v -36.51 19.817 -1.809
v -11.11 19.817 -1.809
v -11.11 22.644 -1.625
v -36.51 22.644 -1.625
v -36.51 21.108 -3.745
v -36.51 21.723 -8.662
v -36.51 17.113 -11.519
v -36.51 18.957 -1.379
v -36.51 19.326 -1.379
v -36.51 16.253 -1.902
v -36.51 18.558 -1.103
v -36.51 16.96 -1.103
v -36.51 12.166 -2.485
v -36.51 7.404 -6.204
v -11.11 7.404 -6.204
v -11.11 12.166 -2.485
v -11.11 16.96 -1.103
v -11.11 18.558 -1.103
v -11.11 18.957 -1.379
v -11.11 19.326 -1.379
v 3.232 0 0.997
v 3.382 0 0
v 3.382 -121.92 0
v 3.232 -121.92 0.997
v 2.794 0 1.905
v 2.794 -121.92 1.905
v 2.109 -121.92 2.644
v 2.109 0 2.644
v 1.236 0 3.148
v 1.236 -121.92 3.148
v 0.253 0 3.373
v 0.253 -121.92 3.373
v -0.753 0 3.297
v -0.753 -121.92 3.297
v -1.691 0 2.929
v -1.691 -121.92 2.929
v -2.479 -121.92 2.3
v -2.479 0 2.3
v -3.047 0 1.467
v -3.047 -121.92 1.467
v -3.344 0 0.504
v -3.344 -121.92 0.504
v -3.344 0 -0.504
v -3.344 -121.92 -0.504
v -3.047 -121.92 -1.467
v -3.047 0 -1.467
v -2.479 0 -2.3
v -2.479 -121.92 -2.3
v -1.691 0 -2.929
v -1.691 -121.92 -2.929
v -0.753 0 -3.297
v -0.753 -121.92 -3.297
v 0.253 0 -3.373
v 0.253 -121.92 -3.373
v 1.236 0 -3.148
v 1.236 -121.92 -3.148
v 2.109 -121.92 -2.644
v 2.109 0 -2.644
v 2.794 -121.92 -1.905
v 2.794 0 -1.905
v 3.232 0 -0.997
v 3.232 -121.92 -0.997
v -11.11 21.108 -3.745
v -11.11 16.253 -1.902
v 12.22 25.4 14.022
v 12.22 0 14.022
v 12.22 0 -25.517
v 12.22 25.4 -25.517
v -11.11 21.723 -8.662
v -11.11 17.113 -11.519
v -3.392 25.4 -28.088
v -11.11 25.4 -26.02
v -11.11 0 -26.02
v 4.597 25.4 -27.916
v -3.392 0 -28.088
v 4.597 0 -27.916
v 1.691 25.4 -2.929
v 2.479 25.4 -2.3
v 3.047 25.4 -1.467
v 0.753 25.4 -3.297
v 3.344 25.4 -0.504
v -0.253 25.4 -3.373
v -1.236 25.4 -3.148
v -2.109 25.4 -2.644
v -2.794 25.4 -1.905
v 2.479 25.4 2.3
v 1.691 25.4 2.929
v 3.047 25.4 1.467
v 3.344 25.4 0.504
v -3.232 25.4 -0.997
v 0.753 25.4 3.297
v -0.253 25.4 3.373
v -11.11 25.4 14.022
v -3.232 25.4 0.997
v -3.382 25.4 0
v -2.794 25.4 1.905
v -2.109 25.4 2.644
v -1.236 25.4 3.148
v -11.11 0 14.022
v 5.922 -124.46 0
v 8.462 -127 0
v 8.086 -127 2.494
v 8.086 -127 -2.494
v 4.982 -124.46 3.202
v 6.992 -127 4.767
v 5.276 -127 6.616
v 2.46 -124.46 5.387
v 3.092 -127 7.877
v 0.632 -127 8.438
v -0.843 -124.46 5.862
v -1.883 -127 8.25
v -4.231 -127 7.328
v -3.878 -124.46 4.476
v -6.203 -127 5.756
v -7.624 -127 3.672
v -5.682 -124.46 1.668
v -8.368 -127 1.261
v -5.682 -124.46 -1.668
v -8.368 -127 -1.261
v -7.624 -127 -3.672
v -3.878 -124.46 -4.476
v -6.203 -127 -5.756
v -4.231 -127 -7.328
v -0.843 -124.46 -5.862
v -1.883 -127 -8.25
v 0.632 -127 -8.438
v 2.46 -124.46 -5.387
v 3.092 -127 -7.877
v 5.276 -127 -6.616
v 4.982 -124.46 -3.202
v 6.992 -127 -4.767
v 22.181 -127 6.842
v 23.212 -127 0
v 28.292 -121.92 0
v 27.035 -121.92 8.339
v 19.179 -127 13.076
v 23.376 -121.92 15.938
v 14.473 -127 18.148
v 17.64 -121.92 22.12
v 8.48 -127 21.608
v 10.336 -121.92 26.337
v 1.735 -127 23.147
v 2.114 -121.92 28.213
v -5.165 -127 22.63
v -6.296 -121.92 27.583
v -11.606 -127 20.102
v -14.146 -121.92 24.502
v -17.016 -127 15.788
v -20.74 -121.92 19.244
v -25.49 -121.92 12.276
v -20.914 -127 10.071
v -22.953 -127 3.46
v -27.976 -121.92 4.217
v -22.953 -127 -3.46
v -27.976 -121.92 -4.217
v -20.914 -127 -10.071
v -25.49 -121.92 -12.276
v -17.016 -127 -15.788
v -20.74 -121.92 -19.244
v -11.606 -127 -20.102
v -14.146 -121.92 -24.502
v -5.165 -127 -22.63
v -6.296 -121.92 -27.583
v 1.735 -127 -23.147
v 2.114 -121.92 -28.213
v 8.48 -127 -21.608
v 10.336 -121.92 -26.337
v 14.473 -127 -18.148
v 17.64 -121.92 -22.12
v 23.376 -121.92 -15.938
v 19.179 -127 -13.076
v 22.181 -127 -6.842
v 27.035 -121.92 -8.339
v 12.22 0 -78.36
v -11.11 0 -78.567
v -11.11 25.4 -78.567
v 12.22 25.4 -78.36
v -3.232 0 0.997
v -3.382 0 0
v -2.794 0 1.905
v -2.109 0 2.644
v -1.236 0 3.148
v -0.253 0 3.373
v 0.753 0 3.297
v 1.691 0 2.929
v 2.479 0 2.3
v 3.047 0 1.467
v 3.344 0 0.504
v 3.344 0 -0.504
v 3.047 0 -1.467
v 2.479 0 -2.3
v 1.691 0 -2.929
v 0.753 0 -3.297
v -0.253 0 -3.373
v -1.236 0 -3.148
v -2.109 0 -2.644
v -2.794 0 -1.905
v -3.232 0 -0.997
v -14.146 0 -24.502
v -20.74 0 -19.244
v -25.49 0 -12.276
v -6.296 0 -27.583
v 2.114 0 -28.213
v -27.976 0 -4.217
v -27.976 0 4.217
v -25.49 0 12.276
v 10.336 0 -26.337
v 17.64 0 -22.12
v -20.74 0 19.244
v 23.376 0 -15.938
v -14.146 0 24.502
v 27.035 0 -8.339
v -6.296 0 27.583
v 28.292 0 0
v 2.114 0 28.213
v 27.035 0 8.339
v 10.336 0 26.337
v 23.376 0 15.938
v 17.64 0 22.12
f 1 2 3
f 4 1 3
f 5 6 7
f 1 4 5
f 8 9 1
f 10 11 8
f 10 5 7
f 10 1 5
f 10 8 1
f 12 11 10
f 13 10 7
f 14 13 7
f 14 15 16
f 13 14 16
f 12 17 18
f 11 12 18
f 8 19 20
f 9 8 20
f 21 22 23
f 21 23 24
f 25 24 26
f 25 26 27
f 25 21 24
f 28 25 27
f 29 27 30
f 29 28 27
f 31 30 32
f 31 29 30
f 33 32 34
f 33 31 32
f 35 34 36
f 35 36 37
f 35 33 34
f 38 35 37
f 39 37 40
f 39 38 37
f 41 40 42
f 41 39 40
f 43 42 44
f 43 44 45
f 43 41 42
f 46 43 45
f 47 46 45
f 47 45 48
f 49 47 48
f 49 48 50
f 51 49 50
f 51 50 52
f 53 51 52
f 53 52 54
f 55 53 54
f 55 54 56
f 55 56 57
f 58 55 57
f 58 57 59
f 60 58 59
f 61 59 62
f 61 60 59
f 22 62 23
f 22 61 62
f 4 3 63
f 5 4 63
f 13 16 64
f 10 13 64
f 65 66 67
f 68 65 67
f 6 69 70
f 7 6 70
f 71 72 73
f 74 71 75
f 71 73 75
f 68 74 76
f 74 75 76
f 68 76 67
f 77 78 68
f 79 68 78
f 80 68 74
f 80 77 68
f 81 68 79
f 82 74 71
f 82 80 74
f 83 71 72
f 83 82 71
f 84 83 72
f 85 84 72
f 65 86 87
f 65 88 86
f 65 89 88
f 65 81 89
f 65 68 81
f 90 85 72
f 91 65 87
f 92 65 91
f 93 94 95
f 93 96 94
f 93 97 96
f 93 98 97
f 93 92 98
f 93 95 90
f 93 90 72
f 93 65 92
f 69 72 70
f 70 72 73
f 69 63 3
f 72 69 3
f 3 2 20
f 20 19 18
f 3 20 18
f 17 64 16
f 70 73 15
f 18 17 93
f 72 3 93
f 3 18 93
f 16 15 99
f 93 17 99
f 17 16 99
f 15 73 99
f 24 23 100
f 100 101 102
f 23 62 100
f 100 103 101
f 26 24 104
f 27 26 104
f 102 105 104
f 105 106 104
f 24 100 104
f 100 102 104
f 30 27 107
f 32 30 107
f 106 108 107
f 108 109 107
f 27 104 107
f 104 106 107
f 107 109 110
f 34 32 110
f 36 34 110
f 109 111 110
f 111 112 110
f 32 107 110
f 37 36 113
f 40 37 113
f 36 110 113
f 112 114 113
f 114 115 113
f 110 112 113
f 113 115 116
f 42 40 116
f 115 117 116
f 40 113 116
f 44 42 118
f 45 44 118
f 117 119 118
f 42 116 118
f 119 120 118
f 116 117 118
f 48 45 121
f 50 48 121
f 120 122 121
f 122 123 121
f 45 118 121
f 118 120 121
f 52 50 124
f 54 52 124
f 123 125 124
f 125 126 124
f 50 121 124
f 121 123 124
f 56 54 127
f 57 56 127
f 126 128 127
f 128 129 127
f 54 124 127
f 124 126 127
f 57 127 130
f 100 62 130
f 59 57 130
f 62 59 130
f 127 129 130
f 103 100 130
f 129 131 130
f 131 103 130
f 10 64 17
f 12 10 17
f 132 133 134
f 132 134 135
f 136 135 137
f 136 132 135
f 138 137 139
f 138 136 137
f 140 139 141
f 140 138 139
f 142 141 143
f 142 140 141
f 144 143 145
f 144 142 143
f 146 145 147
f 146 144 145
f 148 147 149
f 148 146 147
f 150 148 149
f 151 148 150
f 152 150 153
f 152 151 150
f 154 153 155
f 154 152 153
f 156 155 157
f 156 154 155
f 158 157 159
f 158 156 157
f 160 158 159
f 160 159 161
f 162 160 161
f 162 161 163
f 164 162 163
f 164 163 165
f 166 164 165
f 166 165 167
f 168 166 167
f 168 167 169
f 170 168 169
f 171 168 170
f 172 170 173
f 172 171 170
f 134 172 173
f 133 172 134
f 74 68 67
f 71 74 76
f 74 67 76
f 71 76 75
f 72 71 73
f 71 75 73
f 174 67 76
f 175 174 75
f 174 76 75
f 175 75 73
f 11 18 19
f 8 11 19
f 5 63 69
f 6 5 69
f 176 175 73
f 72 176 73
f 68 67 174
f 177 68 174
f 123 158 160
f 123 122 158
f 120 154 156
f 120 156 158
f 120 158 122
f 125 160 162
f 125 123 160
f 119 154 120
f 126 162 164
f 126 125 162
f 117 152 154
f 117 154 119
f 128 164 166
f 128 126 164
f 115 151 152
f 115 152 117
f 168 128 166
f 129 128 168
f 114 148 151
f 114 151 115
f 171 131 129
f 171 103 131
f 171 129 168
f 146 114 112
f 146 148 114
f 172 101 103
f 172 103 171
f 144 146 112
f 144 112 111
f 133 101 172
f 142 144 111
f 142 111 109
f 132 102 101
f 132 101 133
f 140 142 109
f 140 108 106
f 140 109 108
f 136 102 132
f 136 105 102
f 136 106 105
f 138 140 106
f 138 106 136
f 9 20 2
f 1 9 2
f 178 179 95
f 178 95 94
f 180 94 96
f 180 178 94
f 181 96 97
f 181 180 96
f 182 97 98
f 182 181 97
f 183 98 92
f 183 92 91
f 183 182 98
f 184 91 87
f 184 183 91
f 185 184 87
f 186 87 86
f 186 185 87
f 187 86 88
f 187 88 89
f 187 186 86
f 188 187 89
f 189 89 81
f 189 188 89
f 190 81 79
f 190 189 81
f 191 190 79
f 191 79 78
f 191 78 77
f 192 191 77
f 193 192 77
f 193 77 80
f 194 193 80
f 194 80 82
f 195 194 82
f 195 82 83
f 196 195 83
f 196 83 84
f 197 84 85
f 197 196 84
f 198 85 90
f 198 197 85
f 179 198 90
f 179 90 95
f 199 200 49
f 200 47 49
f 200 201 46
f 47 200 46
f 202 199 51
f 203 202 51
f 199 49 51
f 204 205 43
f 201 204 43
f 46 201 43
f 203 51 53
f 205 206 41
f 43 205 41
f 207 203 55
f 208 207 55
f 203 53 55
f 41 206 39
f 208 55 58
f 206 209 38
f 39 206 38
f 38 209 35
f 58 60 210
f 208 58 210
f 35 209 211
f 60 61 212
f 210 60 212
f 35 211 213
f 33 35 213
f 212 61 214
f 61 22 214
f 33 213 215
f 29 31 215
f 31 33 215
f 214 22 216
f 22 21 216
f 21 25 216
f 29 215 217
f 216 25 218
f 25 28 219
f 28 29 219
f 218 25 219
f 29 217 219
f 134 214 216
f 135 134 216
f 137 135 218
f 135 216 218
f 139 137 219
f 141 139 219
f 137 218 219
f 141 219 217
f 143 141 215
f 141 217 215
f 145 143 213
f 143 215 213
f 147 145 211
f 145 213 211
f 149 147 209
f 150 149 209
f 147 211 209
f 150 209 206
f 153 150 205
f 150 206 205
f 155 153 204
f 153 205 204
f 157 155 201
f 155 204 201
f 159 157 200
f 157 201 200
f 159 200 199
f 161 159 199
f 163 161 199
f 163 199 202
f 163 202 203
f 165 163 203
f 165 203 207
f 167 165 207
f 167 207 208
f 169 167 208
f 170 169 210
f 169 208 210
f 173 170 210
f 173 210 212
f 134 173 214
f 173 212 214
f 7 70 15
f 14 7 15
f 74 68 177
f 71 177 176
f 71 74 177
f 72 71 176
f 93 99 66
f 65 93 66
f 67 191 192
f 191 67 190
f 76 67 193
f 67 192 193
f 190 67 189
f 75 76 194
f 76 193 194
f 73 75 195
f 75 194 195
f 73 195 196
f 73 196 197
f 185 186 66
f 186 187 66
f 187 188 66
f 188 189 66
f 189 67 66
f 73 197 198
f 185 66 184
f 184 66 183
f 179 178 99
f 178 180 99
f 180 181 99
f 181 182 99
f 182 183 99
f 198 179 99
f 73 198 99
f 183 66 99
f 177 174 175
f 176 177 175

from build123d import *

# Parameters (mm, degrees)
F0_R     = 28.292316
F0_R_2   = 3.382118
F1_DEPTH = 127
F3_DEPTH = 25.4
F2_R     = 3.382118
F4_DEPTH = 25.4
F5_SIZE  = 5.08
F7_DEPTH = 25.4


with BuildPart() as f1:
    # F0 (on Front) → F1 (new body)
    with BuildSketch(Plane.XZ):
        Circle(F0_R)
        Circle(F0_R_2, mode=Mode.SUBTRACT)
    extrude(amount=F1_DEPTH)

    # F5
    f5_edges = [f1.edges().sort_by_distance(p)[0] for p in [
        (-3.382118, -127, 0),
        (-28.292316, -127, 0),
    ]]
    chamfer(f5_edges, length=F5_SIZE)


with BuildPart() as f3:
    # F2 (on face) → F3 (new body)
    with BuildSketch(Plane(origin=(0, 0, 0), x_dir=(-1, 0, 0), z_dir=(0, 1, 0))):
        with BuildLine():
            ThreePointArc((11.110286, -26.019544), (-0.608986, -28.285761), (-12.219861, -25.517252))
            Line((-12.219861, -25.517252), (-12.219861, -78.360312))
            Line((-12.219861, -78.360312), (11.110286, -78.566521))
            Line((11.110286, -78.566521), (11.110286, -26.019544))
        make_face()
    extrude(amount=F3_DEPTH)


with BuildPart() as f4:
    # F2 (on face) → F4 (new body)
    with BuildSketch(Plane(origin=(0, 0, 0), x_dir=(-1, 0, 0), z_dir=(0, 1, 0))):
        with BuildLine():
            Line((11.110286, 14.022371), (-12.219861, 14.022371))
            Line((-12.219861, 14.022371), (-12.219861, -25.517252))
            ThreePointArc((-12.219861, -25.517252), (-0.608986, -28.285761), (11.110286, -26.019544))
            Line((11.110286, -26.019544), (11.110286, 14.022371))
        make_face()
        Circle(F2_R, mode=Mode.SUBTRACT)
    extrude(amount=F4_DEPTH)

    # F6 (on face) → F7 (join)
    with BuildSketch(Plane(origin=(-11.110286, 0, 0), x_dir=(0, -1, 0), z_dir=(-1, 0, 0))):
        Polygon((-19.325826, -1.37928), (-19.817468, -1.809466), (-22.644401, -1.625101), (-21.108024, -3.745301), (-21.722576, -8.661707), (-17.113443, -11.519369), (-7.403541, -6.203504), (-12.16631, -2.485472), (-16.253073, -1.901649), (-16.959807, -1.102732), (-17.91236, -1.102732), (-18.557638, -1.102732), (-18.957097, -1.37928), align=None)
    extrude(amount=F7_DEPTH)


solid = Compound([f1.part, f3.part, f4.part])
